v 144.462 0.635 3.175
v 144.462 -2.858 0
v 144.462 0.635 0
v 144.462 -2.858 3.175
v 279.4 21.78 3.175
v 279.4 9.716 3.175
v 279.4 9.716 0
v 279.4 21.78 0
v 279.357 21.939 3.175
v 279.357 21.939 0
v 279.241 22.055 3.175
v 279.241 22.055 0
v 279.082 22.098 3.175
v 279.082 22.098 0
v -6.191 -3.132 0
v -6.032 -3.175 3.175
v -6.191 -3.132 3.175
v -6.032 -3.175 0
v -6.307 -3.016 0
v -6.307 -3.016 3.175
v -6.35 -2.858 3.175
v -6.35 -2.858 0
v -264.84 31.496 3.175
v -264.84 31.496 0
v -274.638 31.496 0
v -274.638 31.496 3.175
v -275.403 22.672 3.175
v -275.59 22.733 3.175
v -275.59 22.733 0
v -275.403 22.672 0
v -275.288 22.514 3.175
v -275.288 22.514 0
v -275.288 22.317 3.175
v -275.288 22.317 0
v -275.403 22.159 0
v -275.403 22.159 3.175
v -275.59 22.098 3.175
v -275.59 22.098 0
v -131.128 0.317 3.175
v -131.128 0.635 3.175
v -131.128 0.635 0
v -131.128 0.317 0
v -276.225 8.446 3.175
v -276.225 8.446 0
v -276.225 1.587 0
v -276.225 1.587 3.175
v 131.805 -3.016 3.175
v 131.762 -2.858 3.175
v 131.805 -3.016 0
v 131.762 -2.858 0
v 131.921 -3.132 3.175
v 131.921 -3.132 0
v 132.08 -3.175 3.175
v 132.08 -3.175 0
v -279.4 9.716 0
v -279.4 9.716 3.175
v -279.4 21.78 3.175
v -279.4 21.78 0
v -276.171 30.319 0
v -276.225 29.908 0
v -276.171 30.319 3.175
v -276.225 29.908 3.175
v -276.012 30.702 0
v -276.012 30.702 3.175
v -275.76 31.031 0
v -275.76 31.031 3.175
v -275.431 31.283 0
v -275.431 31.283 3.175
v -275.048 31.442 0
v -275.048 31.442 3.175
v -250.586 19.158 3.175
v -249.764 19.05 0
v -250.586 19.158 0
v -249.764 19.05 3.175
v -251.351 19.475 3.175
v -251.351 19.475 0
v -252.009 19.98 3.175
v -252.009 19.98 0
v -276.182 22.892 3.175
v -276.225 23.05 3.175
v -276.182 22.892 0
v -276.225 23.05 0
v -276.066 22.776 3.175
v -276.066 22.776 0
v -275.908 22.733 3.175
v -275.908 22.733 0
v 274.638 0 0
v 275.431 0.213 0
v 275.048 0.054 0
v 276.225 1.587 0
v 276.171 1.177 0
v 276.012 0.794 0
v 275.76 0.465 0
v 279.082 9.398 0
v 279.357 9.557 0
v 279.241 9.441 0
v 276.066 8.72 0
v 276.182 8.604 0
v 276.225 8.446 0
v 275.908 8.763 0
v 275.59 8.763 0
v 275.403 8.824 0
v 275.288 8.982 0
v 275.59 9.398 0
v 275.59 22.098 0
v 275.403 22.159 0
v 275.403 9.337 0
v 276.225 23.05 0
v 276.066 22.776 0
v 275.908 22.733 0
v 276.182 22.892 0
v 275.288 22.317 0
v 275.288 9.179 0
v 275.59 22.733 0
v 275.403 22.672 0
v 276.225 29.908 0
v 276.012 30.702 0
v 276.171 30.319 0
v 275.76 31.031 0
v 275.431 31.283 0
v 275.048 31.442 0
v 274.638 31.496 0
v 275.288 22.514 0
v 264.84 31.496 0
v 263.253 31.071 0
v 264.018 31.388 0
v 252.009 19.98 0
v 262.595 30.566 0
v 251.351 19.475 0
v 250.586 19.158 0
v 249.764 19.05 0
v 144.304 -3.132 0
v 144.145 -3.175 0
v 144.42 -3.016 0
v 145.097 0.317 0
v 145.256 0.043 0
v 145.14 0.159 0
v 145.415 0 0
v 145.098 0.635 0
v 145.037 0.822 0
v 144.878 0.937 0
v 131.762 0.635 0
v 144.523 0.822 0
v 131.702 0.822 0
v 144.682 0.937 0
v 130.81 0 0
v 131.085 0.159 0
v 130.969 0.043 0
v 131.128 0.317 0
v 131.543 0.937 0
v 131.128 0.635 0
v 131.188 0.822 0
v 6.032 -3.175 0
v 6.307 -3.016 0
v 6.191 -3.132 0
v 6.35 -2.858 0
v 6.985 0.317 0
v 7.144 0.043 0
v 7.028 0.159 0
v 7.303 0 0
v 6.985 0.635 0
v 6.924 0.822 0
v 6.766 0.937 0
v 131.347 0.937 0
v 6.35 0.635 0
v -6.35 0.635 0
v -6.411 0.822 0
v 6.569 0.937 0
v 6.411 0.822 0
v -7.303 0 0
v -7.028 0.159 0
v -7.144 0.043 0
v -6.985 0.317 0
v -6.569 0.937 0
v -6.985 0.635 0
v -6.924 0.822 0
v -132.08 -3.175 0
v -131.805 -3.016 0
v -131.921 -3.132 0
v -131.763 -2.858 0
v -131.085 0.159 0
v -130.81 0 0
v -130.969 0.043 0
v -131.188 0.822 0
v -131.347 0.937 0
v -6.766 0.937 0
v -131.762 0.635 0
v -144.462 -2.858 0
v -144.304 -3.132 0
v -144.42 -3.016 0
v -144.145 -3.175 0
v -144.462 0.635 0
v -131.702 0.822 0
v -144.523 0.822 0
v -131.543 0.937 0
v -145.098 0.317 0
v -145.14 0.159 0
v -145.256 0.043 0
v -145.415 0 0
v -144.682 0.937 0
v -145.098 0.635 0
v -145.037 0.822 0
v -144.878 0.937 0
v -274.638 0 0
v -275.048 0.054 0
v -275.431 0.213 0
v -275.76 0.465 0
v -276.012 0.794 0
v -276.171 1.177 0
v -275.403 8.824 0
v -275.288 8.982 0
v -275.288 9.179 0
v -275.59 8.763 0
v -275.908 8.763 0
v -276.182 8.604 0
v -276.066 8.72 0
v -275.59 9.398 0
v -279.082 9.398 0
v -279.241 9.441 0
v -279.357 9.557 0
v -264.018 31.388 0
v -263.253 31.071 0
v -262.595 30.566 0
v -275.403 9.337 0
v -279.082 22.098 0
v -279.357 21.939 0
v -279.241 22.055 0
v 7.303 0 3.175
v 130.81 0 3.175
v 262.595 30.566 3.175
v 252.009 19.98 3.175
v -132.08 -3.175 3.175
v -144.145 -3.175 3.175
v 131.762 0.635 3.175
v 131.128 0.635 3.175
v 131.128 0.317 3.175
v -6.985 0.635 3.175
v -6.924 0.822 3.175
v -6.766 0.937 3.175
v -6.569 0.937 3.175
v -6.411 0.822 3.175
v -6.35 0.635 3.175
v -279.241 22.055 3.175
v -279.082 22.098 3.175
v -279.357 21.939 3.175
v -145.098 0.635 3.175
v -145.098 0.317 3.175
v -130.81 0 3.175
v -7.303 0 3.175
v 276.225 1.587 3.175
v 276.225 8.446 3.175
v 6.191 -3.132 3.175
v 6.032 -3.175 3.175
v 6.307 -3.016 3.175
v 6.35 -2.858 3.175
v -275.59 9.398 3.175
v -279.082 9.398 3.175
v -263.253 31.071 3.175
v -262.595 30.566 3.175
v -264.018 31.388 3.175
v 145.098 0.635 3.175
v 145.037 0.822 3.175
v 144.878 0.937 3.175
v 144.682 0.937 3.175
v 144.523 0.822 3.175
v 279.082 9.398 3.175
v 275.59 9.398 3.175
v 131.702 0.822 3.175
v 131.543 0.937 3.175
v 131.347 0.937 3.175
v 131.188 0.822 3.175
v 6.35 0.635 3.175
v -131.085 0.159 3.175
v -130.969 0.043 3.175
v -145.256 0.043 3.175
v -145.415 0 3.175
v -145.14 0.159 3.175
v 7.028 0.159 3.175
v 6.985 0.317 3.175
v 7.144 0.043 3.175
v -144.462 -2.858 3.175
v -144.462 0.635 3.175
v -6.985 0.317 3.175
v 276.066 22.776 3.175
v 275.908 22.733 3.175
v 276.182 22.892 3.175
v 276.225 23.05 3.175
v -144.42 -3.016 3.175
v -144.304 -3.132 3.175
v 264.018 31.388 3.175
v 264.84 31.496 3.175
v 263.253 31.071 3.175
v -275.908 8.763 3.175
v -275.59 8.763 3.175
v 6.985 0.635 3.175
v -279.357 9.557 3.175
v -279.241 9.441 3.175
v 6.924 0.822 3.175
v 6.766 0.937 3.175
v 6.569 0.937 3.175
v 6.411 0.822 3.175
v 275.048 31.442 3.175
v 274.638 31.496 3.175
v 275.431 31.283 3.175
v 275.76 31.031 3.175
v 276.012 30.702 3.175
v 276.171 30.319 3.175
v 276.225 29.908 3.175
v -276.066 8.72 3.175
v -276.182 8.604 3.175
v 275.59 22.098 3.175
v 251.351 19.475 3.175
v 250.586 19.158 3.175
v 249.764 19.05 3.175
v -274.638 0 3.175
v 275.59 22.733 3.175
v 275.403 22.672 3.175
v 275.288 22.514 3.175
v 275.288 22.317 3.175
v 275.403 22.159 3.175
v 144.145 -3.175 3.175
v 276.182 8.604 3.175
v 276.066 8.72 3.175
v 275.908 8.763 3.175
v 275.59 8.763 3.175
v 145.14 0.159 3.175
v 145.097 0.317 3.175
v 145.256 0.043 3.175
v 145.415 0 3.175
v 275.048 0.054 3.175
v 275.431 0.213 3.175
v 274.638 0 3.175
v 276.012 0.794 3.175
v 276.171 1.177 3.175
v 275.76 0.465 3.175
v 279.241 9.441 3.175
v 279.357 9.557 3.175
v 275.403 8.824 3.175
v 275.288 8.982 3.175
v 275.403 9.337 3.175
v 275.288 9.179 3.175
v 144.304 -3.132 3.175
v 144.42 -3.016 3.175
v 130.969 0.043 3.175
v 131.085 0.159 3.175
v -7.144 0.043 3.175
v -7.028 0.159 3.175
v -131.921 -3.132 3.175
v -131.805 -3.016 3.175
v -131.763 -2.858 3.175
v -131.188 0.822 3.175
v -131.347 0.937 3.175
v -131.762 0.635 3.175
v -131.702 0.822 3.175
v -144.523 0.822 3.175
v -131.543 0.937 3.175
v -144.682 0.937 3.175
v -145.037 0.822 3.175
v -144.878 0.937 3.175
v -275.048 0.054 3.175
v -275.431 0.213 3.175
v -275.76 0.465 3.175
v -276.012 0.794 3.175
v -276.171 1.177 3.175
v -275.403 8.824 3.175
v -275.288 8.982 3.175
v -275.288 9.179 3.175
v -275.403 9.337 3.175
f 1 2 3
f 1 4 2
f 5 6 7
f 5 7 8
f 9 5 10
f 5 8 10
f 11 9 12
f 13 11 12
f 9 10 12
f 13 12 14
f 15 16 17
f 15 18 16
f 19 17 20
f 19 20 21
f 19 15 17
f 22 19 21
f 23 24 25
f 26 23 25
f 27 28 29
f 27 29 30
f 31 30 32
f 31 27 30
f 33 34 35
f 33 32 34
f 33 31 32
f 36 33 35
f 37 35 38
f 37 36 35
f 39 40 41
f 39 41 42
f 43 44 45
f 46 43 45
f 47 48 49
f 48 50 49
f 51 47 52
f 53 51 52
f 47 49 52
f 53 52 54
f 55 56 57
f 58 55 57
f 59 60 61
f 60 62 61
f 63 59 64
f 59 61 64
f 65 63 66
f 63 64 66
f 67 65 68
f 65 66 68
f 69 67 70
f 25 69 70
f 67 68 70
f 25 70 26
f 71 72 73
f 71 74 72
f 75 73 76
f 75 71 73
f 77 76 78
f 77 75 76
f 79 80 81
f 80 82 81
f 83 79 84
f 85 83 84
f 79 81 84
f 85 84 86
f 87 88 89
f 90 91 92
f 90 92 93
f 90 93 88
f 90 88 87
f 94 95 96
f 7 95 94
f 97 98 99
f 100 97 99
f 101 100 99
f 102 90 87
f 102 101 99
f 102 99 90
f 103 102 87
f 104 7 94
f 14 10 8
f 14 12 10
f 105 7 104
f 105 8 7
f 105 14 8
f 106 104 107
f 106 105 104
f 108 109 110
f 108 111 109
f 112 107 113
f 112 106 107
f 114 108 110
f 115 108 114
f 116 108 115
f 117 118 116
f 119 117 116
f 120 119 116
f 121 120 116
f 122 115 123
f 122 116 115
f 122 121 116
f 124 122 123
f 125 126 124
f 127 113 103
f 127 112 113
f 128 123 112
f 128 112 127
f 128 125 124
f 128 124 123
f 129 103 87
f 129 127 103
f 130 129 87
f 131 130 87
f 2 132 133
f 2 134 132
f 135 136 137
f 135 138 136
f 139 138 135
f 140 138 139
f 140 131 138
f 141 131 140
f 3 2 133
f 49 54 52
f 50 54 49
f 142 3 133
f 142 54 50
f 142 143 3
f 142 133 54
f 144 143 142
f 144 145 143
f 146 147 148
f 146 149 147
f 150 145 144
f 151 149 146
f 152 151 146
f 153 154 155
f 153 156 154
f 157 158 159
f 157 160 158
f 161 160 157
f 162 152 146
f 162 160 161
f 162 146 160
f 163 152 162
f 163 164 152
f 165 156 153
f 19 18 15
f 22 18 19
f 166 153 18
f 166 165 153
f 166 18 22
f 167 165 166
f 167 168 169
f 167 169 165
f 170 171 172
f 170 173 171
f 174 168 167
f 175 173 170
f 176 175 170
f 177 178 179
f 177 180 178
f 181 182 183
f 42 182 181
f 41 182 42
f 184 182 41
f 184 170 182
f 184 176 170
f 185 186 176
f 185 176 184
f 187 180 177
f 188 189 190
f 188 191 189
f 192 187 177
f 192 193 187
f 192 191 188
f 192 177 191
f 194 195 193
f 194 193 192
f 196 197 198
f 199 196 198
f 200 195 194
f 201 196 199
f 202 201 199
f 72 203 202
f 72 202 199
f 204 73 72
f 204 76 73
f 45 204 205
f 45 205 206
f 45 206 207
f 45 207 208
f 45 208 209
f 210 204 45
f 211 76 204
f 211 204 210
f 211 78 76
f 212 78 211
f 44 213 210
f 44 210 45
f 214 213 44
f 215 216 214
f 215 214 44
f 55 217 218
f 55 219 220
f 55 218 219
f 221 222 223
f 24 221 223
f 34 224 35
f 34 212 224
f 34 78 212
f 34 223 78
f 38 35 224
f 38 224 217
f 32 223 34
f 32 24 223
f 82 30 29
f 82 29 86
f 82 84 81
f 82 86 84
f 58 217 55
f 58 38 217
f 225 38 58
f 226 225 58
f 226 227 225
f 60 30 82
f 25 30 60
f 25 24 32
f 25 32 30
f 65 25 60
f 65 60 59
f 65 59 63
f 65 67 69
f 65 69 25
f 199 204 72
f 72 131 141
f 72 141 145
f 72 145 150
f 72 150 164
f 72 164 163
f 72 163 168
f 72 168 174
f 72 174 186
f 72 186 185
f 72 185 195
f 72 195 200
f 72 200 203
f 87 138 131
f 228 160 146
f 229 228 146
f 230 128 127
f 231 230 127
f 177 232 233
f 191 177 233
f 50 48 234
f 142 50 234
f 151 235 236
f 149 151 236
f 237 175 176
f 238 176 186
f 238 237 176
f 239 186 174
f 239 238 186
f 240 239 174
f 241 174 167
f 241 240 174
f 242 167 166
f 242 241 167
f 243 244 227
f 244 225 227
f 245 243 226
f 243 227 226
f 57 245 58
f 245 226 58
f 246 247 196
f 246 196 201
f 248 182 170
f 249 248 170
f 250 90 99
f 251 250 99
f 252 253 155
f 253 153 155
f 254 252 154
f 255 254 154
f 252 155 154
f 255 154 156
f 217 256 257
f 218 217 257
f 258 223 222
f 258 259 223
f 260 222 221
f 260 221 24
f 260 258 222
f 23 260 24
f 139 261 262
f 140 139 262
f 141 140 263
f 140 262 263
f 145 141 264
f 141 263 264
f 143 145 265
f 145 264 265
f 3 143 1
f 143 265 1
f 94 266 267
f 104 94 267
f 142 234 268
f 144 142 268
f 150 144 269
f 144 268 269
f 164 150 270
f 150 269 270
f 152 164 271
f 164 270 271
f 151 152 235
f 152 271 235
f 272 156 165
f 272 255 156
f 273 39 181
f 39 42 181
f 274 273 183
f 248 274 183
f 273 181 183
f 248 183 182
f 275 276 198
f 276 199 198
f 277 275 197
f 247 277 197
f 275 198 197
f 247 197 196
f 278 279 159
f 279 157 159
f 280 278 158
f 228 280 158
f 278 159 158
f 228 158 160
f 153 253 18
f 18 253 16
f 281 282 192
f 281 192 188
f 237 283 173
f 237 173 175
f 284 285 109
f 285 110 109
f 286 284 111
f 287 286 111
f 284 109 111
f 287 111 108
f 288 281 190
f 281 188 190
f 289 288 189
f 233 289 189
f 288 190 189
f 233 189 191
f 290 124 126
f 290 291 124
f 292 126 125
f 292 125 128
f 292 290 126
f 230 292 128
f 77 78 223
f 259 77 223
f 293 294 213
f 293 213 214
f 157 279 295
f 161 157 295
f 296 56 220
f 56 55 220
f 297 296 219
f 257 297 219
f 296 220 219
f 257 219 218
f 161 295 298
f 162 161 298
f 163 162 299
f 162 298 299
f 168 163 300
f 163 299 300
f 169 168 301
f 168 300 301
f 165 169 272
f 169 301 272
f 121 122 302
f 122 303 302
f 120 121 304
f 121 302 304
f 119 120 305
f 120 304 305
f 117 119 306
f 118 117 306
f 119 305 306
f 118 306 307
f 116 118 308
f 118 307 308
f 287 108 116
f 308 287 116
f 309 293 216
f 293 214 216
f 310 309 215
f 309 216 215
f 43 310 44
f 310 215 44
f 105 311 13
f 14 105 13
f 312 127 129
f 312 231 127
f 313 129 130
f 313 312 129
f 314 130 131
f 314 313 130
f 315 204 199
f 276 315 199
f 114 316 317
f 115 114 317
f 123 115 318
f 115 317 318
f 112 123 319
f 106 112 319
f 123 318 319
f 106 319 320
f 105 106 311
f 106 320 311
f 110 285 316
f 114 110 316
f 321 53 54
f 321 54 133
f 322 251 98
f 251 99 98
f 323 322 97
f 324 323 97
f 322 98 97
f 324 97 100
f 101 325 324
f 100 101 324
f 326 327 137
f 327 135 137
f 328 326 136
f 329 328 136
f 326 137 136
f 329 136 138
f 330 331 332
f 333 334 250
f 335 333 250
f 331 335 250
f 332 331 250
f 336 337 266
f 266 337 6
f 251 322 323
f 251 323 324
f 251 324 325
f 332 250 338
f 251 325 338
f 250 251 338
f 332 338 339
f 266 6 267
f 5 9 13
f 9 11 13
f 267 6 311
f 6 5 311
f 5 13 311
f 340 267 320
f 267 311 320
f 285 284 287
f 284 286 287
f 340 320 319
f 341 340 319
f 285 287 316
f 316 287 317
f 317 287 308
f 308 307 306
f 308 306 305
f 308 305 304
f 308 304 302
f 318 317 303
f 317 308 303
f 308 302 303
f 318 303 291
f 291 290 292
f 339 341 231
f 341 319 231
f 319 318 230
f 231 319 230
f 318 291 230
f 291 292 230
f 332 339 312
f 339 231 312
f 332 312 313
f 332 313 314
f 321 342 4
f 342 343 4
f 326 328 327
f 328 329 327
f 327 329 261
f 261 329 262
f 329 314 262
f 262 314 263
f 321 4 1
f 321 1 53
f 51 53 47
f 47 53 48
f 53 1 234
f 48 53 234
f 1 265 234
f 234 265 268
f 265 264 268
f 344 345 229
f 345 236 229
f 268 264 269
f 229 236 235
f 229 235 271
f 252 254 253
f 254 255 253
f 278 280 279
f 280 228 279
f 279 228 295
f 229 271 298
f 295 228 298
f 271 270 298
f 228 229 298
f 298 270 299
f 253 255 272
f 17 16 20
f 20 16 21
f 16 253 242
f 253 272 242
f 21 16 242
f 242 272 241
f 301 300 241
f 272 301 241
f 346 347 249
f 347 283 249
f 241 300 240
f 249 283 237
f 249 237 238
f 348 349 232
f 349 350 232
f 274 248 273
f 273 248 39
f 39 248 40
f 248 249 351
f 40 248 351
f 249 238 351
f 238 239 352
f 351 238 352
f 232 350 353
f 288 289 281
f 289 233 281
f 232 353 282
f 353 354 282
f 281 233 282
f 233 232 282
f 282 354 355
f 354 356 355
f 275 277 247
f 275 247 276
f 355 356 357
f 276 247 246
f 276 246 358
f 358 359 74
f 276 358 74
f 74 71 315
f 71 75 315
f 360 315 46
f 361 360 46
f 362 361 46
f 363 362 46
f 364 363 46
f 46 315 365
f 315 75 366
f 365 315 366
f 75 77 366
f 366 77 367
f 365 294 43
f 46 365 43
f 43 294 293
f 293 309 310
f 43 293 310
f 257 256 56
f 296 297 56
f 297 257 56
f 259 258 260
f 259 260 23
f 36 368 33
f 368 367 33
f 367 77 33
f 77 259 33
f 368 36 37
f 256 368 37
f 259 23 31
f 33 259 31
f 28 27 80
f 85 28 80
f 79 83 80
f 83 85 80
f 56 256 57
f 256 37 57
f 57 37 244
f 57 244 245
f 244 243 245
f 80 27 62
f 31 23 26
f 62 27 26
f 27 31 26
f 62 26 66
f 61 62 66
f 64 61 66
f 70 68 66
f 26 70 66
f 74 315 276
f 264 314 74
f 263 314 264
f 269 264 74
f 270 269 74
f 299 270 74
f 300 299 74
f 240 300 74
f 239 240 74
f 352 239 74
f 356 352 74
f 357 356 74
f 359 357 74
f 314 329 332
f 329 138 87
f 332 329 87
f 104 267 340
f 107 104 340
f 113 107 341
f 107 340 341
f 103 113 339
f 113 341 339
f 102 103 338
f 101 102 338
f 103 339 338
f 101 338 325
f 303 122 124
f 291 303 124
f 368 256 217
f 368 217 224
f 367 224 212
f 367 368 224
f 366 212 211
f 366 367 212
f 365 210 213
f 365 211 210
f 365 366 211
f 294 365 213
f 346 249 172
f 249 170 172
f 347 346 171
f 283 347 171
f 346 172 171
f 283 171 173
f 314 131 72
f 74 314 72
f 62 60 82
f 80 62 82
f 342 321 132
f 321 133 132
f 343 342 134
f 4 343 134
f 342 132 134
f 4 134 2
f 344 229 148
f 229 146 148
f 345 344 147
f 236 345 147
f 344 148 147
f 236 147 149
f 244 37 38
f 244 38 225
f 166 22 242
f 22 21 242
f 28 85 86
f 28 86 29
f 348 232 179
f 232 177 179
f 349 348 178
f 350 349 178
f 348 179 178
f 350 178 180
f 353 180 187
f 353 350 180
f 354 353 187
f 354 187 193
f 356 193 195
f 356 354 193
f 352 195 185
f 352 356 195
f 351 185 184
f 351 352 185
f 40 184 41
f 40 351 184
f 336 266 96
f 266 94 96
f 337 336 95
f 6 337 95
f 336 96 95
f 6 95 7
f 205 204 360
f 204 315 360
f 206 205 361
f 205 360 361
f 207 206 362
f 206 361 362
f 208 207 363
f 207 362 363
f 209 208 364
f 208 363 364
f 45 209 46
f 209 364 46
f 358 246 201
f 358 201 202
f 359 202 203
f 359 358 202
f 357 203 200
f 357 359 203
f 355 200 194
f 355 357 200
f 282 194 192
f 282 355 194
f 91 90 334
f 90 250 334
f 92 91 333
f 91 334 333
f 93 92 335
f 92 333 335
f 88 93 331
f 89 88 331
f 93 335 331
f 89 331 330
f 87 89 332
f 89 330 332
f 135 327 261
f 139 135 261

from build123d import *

# Parameters (mm, degrees)
BOSS_EXTRUDE1_DEPTH = 3.175
FILLET1_R           = 3.175
FILLET2_R           = 1.5875
SKETCH3_W           = 3.175
SKETCH3_H           = 12.7
SKETCH3_W_2         = 12.7
SKETCH3_H_2         = 3.175
SKETCH3_W_3         = 6.35
BOSS_EXTRUDE2_DEPTH = 3.175
CUT_EXTRUDE1_DEPTH  = 282.187550651
FILLET3_R           = 0.3175


with BuildPart() as part:
    # Sketch1 → Boss-Extrude1 (new body)
    with BuildSketch(Plane.XY):
        Polygon((-276.225, 0), (276.225, 0), (276.225, 31.496), (263.525, 31.496), (251.079, 19.05), (-251.079, 19.05), (-263.525, 31.496), (-276.225, 31.496), align=None)
    extrude(amount=BOSS_EXTRUDE1_DEPTH)

    # Fillet1
    fillet1_edges = [part.edges().sort_by_distance(p)[0] for p in [
        (-263.525, 31.496, 1.5875),
        (-251.079, 19.05, 1.5875),
        (251.079, 19.05, 1.5875),
        (263.525, 31.496, 1.5875),
    ]]
    fillet(fillet1_edges, radius=FILLET1_R)

    # Fillet2
    fillet2_edges = [part.edges().sort_by_distance(p)[0] for p in [
        (-276.225, 31.496, 1.5875),
        (276.225, 31.496, 1.5875),
        (276.225, 0, 1.5875),
        (-276.225, 0, 1.5875),
    ]]
    fillet(fillet2_edges, radius=FILLET2_R)

    # Sketch3 → Boss-Extrude2 (add)
    with BuildSketch(Plane.XY.offset(3.175)):
        with Locations((277.8125, 15.748)):
            Rectangle(SKETCH3_W, SKETCH3_H)
        with Locations((138.1125, -1.5875)):
            Rectangle(SKETCH3_W_2, SKETCH3_H_2)
        with Locations((3.175, -1.5875)):
            Rectangle(SKETCH3_W_3, SKETCH3_H_2)
    boss_extrude2 = extrude(amount=-BOSS_EXTRUDE2_DEPTH)

    # Mirror1: Boss-Extrude2 across plane
    add(boss_extrude2.mirror(Plane(origin=(0, 0, 0), x_dir=(0, 0, 1), z_dir=(1, 0, 0))))

    # Sketch4 → Cut-Extrude1 (cut, through all)
    with BuildSketch(Plane.XY.offset(3.175)):
        with BuildLine():
            Line((-276.225, 22.733), (-275.59, 22.733))
            ThreePointArc((-275.59, 22.733), (-275.2725, 22.4155), (-275.59, 22.098))
            Line((-275.59, 22.098), (-276.225, 22.098))
            ThreePointArc((-276.225, 22.098), (-276.5425, 22.4155), (-276.225, 22.733))
        make_face()
        with BuildLine():
            Line((-276.225, 9.398), (-275.59, 9.398))
            ThreePointArc((-275.59, 9.398), (-275.2725, 9.0805), (-275.59, 8.763))
            Line((-275.59, 8.763), (-276.225, 8.763))
            ThreePointArc((-276.225, 8.763), (-276.5425, 9.0805), (-276.225, 9.398))
        make_face()
        with BuildLine():
            Line((-145.0975, 0), (-145.0975, 0.635))
            ThreePointArc((-145.0975, 0.635), (-144.78, 0.9525), (-144.4625, 0.635))
            Line((-144.4625, 0.635), (-144.4625, 0))
            ThreePointArc((-144.4625, 0), (-144.78, -0.3175), (-145.0975, 0))
        make_face()
        with BuildLine():
            Line((-131.1275, 0.635), (-131.1275, 0))
            ThreePointArc((-131.1275, 0), (-131.445, -0.3175), (-131.7625, 0))
            Line((-131.7625, 0), (-131.7625, 0.635))
            ThreePointArc((-131.7625, 0.635), (-131.445, 0.9525), (-131.1275, 0.635))
        make_face()
        with BuildLine():
            Line((-6.985, 0), (-6.985, 0.635))
            ThreePointArc((-6.985, 0.635), (-6.6675, 0.9525), (-6.35, 0.635))
            Line((-6.35, 0.635), (-6.35, 0))
            ThreePointArc((-6.35, 0), (-6.6675, -0.3175), (-6.985, 0))
        make_face()
    cut_extrude1 = extrude(amount=-CUT_EXTRUDE1_DEPTH, mode=Mode.SUBTRACT)

    # Mirror2: Cut-Extrude1 across plane
    add(cut_extrude1.mirror(Plane(origin=(0, 0, 0), x_dir=(0, 0, 1), z_dir=(1, 0, 0))), mode=Mode.SUBTRACT)

    # Fillet3
    fillet3_edges = [part.edges().sort_by_distance(p)[0] for p in [
        (-279.4, 22.098, 1.5875),
        (-279.4, 9.398, 1.5875),
        (-144.4625, -3.175, 1.5875),
        (-131.7625, -3.175, 1.5875),
        (-6.35, -3.175, 1.5875),
        (-276.225, 22.733, 1.5875),
        (-276.225, 8.763, 1.5875),
        (-145.0975, 0, 1.5875),
        (-131.1275, 0, 1.5875),
        (-6.985, 0, 1.5875),
        (276.225, 22.733, 1.5875),
        (276.225, 8.763, 1.5875),
        (145.0975, 0, 1.5875),
        (131.1275, 0, 1.5875),
        (6.985, 0, 1.5875),
        (279.4, 22.098, 1.5875),
        (279.4, 9.398, 1.5875),
        (131.7625, -3.175, 1.5875),
        (144.4625, -3.175, 1.5875),
        (6.35, -3.175, 1.5875),
    ]]
    fillet(fillet3_edges, radius=FILLET3_R)


solid = part.part
